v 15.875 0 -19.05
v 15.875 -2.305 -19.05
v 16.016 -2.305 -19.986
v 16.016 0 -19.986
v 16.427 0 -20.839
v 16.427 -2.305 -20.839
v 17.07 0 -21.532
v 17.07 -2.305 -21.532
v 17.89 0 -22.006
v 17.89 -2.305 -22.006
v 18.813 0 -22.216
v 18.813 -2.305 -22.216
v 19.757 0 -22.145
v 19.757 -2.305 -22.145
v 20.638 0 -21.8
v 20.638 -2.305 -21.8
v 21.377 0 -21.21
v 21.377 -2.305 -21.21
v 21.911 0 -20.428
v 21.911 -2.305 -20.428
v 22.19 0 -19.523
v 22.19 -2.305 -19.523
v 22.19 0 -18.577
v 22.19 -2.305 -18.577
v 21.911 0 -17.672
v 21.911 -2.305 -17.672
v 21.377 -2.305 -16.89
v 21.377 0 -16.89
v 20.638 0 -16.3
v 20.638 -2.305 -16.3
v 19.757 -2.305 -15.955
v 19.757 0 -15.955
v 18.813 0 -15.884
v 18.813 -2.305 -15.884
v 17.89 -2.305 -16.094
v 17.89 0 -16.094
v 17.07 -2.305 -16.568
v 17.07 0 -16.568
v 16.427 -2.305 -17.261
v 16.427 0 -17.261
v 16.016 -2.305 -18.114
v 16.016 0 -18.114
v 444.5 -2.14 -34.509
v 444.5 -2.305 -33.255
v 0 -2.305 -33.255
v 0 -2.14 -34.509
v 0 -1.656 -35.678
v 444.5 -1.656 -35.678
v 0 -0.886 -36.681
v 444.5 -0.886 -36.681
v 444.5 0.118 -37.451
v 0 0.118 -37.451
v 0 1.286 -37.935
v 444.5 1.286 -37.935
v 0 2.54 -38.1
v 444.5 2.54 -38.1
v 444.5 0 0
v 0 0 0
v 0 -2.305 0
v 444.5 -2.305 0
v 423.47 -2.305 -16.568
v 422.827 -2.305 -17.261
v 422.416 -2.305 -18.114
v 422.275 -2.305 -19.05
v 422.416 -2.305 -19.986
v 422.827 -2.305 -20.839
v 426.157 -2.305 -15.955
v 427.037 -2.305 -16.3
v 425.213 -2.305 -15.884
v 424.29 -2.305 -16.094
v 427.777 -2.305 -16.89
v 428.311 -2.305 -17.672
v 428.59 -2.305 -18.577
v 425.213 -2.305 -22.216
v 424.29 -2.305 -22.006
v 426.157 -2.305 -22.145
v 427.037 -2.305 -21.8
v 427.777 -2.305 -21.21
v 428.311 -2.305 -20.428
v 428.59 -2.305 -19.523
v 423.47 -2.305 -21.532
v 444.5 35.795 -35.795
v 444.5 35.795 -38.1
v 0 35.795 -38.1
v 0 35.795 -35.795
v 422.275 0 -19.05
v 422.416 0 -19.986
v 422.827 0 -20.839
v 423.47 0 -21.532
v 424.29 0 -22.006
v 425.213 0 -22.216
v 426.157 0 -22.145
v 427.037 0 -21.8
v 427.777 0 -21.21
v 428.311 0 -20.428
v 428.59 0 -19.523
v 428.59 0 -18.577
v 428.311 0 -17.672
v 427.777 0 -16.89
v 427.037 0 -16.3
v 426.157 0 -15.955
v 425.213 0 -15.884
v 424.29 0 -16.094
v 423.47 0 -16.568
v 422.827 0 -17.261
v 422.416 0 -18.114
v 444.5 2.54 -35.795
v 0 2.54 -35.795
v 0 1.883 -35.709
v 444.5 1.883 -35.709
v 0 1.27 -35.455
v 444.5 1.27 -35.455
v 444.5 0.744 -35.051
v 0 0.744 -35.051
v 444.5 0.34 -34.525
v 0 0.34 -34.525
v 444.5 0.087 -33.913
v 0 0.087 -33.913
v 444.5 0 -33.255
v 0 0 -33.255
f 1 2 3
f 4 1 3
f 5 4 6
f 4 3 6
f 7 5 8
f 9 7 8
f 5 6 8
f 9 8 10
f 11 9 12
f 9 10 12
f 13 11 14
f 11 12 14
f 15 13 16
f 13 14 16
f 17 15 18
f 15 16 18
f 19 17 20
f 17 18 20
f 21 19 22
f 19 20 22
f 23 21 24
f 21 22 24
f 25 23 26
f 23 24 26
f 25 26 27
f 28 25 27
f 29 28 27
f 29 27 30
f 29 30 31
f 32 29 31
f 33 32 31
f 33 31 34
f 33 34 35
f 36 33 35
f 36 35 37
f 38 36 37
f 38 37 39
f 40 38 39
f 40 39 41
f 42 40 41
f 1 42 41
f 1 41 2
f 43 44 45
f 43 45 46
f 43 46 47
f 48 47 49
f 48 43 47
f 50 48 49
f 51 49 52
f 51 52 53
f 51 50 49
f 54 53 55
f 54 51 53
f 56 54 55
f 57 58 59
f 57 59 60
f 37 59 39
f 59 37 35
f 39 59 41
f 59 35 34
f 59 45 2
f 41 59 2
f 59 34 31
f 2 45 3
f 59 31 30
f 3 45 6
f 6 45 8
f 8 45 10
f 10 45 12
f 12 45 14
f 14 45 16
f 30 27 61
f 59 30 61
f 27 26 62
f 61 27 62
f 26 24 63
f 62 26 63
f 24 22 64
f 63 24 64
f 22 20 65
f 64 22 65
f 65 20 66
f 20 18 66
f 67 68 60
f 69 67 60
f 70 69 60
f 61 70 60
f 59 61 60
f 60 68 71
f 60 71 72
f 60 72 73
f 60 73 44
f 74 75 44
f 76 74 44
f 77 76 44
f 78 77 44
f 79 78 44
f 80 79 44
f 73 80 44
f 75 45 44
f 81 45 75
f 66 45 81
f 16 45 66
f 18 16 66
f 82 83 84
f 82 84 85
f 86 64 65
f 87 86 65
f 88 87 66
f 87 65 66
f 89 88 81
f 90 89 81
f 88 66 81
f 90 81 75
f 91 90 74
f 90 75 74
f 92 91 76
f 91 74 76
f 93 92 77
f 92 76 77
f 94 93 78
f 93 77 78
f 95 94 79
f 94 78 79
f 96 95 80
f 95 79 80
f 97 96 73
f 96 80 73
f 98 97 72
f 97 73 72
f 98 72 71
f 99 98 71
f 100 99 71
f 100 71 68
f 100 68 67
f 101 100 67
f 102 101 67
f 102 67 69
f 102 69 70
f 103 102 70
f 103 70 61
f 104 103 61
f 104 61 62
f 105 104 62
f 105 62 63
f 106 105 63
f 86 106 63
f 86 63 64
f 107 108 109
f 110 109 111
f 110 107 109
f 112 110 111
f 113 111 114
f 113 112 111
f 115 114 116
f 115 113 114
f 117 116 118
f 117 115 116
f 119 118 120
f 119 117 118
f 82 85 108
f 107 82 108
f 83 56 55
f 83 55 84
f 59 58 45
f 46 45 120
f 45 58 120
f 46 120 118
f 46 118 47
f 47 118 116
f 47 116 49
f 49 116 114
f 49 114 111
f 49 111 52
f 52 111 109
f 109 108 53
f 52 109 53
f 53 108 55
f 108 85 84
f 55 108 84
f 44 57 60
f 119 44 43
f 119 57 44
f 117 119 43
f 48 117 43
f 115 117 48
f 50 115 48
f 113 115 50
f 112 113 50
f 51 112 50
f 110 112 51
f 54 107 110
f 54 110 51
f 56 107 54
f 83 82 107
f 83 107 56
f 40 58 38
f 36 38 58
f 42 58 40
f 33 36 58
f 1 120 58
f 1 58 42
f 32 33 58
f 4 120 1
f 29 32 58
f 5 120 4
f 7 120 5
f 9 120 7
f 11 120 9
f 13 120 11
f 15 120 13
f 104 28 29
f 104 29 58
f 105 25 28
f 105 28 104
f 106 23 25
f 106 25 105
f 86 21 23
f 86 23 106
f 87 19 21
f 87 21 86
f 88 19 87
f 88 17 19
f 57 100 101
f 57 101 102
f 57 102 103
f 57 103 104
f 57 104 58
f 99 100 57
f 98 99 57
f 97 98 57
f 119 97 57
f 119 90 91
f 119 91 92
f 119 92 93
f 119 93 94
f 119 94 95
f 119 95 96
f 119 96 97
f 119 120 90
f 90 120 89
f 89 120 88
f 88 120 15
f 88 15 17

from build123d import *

# Parameters (mm, degrees)
SKETCH1_W                    = 444.5
SKETCH1_H                    = 38.1
BASE_FLANGE1_DEPTH           = 2.304796
EDGE_FLANGE1_STRIP_W         = 14.299184
EDGE_FLANGE1_STRIP_H         = 2.304796
EDGE_FLANGE1_STRIP_CUT_DEPTH = 444.5
EDGE_FLANGE1_DEPTH           = 444.5
F_1_4_0_25_DIAMETER_HOLE1_D  = 6.35


# Sheet-metal steps are written as plain solids
with BuildPart() as part:
    # Sketch1 → Base-Flange1 (new body)
    with BuildSketch(Plane(origin=(0, 0, 0), x_dir=(1, 0, 0), z_dir=(0, 1, 0))):
        with Locations((222.25, 19.05)):
            Rectangle(SKETCH1_W, SKETCH1_H)
    extrude(amount=-BASE_FLANGE1_DEPTH)

    # Edge-Flange1 strip (across the edge) → Edge-Flange1 strip cut (cut)
    with BuildSketch(Plane(origin=(444.5, 0, -38.1), x_dir=(0, 0, 1), z_dir=(-1, 0, 0))):
        with Locations((-2.304796, -1.152398)):
            Rectangle(EDGE_FLANGE1_STRIP_W, EDGE_FLANGE1_STRIP_H)
    extrude(amount=EDGE_FLANGE1_STRIP_CUT_DEPTH, mode=Mode.SUBTRACT)

    # Edge-Flange1 section (across the edge) → Edge-Flange1 (add)
    with BuildSketch(Plane(origin=(444.5, 0, -38.1), x_dir=(0, 0, 1), z_dir=(-1, 0, 0))):
        with BuildLine():
            Line((0, 2.54), (0, 35.795204))
            Line((0, 35.795204), (2.304796, 35.795204))
            Line((2.304796, 35.795204), (2.304796, 2.54))
            ThreePointArc((2.304796, 2.54), (3.048744776, 0.743948776), (4.844796, 0))
            Line((4.844796, 0), (4.844796, -2.304796))
            ThreePointArc((4.844796, -2.304796), (1.419007895, -0.885788105), (0, 2.54))
        make_face()
    extrude(amount=EDGE_FLANGE1_DEPTH)

    # 1/4 (0.25) Diameter Hole1 (through all)
    with Locations(Plane(origin=(0, 0, 0), x_dir=(1, 0, 0), z_dir=(0, 1, 0))):
        with Locations((19.05, 19.05), (425.45, 19.05)):
            Hole(F_1_4_0_25_DIAMETER_HOLE1_D / 2)


solid = part.part
